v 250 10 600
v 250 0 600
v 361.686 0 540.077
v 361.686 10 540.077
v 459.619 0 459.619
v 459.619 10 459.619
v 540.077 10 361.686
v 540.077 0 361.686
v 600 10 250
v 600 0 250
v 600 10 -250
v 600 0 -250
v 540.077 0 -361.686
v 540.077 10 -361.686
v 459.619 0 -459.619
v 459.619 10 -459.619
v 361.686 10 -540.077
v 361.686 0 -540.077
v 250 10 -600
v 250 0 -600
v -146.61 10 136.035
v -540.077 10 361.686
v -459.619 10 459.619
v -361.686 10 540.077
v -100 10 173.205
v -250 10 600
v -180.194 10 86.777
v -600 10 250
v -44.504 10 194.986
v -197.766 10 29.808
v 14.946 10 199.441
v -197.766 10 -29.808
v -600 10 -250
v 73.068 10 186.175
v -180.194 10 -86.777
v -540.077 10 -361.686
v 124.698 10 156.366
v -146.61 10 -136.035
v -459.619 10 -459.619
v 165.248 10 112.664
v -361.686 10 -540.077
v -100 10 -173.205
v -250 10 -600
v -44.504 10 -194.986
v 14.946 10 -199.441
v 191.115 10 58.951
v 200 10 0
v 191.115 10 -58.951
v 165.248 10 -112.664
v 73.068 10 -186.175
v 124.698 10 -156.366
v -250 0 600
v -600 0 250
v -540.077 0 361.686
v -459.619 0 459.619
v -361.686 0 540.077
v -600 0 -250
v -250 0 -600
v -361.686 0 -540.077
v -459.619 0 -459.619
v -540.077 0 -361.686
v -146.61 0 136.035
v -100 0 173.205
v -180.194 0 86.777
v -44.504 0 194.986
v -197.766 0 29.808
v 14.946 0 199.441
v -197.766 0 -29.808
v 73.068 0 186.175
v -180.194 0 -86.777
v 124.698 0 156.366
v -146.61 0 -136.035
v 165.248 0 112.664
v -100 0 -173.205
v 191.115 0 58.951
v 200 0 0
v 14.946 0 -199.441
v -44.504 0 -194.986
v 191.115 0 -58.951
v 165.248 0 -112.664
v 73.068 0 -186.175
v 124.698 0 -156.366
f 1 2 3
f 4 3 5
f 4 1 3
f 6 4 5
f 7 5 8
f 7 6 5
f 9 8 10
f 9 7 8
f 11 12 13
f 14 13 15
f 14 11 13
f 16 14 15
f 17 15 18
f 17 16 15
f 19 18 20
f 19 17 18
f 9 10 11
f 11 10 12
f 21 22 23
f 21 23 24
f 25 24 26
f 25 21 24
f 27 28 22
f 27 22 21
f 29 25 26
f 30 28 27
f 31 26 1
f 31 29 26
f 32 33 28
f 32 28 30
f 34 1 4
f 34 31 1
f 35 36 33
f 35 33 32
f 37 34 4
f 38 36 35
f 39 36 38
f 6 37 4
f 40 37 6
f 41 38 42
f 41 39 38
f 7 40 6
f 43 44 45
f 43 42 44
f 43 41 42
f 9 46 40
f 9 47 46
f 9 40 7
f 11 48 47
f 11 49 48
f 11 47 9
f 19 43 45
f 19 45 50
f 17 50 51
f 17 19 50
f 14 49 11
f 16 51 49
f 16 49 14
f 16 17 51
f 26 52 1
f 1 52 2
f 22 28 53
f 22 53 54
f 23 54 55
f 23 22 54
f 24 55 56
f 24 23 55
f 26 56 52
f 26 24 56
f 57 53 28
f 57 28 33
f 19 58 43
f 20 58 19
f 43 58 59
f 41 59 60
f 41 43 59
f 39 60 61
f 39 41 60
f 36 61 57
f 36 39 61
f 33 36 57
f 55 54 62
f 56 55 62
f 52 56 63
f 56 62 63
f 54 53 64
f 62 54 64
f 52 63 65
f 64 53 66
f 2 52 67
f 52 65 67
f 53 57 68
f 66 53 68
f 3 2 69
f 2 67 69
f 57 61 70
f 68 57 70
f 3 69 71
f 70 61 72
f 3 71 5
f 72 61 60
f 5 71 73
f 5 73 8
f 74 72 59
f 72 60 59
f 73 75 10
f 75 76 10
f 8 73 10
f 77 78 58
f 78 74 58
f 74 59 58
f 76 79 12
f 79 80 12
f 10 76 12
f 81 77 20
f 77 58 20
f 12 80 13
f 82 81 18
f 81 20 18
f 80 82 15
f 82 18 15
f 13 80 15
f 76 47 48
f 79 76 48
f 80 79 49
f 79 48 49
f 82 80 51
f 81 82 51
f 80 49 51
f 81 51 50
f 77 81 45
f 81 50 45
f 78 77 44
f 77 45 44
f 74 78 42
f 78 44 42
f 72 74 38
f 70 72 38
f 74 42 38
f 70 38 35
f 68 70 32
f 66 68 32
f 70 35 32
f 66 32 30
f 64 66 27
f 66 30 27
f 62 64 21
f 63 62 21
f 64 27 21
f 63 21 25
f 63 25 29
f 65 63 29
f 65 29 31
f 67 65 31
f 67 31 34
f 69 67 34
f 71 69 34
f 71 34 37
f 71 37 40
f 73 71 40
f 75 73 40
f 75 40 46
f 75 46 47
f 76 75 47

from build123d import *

# Parameters (mm, degrees)
SKETCH1_W           = 1200
SKETCH1_H           = 1200
BOSS_EXTRUDE1_DEPTH = 10
SKETCH2_R           = 200
CUT_EXTRUDE1_DEPTH  = 11
SKETCH3_R           = 1053.62312192
SKETCH3_R_2         = 650
CUT_EXTRUDE2_DEPTH  = 11


with BuildPart() as part:
    # Sketch1 → Boss-Extrude1 (new body)
    with BuildSketch(Plane(origin=(0, 0, 0), x_dir=(1, 0, 0), z_dir=(0, 1, 0))):
        Rectangle(SKETCH1_W, SKETCH1_H)
    extrude(amount=BOSS_EXTRUDE1_DEPTH)

    # Sketch2 → Cut-Extrude1 (cut, through all)
    with BuildSketch(Plane(origin=(0, 10, 0), x_dir=(1, 0, 0), z_dir=(0, 1, 0))):
        Circle(SKETCH2_R)
    extrude(amount=-CUT_EXTRUDE1_DEPTH, mode=Mode.SUBTRACT)

    # Sketch3 → Cut-Extrude2 (cut, through all)
    with BuildSketch(Plane(origin=(0, 10, 0), x_dir=(1, 0, 0), z_dir=(0, 1, 0))):
        Circle(SKETCH3_R)
        Circle(SKETCH3_R_2, mode=Mode.SUBTRACT)
    extrude(amount=-CUT_EXTRUDE2_DEPTH, mode=Mode.SUBTRACT)


solid = part.part
